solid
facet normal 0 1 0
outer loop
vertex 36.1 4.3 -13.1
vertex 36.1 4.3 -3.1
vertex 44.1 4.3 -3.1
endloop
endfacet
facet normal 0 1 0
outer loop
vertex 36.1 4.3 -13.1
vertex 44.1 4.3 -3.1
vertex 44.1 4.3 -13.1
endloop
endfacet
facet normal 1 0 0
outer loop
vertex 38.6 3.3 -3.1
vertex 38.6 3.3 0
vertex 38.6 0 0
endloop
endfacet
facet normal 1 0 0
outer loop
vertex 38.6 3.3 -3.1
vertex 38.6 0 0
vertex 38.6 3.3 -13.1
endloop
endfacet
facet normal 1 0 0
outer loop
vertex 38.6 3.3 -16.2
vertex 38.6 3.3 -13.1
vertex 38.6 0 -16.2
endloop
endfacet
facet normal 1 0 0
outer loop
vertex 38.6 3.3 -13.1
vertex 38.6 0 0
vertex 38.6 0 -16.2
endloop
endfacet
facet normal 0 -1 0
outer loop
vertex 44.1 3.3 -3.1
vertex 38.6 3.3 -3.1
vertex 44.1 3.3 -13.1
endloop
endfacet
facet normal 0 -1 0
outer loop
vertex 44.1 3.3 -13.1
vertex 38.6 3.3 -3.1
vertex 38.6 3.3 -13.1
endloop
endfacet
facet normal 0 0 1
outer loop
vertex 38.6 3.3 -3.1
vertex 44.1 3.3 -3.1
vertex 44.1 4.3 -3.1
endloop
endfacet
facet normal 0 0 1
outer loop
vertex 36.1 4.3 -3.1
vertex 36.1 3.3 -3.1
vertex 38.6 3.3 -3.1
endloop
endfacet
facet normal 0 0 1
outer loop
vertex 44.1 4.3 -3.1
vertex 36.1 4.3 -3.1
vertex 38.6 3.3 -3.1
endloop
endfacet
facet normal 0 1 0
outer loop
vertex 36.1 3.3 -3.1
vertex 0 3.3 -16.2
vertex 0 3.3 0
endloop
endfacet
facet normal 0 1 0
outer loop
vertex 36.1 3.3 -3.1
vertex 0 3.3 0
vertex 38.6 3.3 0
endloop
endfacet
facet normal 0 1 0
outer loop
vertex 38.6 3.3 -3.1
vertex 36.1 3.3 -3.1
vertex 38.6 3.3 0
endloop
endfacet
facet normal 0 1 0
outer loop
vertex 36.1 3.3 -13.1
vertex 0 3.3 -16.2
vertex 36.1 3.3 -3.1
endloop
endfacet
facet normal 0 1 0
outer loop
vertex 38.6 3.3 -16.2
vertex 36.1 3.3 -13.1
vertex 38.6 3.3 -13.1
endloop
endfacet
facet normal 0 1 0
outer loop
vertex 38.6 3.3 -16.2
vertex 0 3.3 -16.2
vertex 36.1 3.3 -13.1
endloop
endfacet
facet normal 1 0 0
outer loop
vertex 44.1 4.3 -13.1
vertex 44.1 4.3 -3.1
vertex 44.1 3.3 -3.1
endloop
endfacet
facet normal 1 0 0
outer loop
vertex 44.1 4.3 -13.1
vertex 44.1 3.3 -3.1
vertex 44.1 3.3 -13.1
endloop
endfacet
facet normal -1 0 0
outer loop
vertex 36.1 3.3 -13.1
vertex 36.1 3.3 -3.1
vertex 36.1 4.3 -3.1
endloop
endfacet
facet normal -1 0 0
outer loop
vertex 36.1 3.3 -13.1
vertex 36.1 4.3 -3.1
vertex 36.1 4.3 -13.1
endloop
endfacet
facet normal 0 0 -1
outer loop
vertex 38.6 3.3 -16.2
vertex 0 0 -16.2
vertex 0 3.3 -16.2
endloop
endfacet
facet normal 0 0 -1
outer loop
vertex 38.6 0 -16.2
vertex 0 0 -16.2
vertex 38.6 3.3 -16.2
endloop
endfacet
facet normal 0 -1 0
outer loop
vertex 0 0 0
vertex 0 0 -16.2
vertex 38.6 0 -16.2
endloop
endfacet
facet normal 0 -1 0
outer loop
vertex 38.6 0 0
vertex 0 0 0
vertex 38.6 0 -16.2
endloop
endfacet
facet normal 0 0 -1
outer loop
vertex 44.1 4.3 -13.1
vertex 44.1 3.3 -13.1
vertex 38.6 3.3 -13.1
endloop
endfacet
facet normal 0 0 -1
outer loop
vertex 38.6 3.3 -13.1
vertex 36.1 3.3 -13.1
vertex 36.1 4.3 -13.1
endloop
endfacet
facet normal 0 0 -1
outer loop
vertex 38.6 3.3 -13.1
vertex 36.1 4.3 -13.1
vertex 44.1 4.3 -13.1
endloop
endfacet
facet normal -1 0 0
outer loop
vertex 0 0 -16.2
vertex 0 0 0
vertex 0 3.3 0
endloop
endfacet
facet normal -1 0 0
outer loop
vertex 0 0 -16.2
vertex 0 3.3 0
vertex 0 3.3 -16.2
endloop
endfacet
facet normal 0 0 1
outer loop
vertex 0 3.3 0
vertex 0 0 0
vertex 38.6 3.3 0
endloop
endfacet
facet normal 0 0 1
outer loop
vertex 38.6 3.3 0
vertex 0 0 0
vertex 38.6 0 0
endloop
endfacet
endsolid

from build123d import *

# Parameters (mm, degrees)
SKETCH_1_W      = 38.6
SKETCH_1_H      = 16.2
EXTRUDE_1_DEPTH = 3.3
SKETCH_2_W      = 2.5
SKETCH_2_H      = 10
EXTRUDE_2_DEPTH = 1
SKETCH_3_W      = 10
SKETCH_3_H      = 1
EXTRUDE_3_DEPTH = 5.5


with BuildPart() as part:
    # 草图1 → 凸台-拉伸1 (new body)
    with BuildSketch(Plane(origin=(0, 0, 0), x_dir=(1, 0, 0), z_dir=(0, 1, 0))):
        with Locations((19.3, 8.1)):
            Rectangle(SKETCH_1_W, SKETCH_1_H)
    extrude(amount=EXTRUDE_1_DEPTH)

    # 草图2 → 凸台-拉伸2 (add)
    with BuildSketch(Plane(origin=(0, 3.3, 0), x_dir=(1, 0, 0), z_dir=(0, 1, 0))):
        with Locations((37.35, 8.1)):
            Rectangle(SKETCH_2_W, SKETCH_2_H)
    extrude(amount=EXTRUDE_2_DEPTH)

    # 草图3 → 凸台-拉伸3 (add)
    with BuildSketch(Plane(origin=(38.6, 0, 0), x_dir=(0, 0, -1), z_dir=(1, 0, 0))):
        with Locations((8.1, 3.8)):
            Rectangle(SKETCH_3_W, SKETCH_3_H)
    extrude(amount=EXTRUDE_3_DEPTH)


solid = part.part
